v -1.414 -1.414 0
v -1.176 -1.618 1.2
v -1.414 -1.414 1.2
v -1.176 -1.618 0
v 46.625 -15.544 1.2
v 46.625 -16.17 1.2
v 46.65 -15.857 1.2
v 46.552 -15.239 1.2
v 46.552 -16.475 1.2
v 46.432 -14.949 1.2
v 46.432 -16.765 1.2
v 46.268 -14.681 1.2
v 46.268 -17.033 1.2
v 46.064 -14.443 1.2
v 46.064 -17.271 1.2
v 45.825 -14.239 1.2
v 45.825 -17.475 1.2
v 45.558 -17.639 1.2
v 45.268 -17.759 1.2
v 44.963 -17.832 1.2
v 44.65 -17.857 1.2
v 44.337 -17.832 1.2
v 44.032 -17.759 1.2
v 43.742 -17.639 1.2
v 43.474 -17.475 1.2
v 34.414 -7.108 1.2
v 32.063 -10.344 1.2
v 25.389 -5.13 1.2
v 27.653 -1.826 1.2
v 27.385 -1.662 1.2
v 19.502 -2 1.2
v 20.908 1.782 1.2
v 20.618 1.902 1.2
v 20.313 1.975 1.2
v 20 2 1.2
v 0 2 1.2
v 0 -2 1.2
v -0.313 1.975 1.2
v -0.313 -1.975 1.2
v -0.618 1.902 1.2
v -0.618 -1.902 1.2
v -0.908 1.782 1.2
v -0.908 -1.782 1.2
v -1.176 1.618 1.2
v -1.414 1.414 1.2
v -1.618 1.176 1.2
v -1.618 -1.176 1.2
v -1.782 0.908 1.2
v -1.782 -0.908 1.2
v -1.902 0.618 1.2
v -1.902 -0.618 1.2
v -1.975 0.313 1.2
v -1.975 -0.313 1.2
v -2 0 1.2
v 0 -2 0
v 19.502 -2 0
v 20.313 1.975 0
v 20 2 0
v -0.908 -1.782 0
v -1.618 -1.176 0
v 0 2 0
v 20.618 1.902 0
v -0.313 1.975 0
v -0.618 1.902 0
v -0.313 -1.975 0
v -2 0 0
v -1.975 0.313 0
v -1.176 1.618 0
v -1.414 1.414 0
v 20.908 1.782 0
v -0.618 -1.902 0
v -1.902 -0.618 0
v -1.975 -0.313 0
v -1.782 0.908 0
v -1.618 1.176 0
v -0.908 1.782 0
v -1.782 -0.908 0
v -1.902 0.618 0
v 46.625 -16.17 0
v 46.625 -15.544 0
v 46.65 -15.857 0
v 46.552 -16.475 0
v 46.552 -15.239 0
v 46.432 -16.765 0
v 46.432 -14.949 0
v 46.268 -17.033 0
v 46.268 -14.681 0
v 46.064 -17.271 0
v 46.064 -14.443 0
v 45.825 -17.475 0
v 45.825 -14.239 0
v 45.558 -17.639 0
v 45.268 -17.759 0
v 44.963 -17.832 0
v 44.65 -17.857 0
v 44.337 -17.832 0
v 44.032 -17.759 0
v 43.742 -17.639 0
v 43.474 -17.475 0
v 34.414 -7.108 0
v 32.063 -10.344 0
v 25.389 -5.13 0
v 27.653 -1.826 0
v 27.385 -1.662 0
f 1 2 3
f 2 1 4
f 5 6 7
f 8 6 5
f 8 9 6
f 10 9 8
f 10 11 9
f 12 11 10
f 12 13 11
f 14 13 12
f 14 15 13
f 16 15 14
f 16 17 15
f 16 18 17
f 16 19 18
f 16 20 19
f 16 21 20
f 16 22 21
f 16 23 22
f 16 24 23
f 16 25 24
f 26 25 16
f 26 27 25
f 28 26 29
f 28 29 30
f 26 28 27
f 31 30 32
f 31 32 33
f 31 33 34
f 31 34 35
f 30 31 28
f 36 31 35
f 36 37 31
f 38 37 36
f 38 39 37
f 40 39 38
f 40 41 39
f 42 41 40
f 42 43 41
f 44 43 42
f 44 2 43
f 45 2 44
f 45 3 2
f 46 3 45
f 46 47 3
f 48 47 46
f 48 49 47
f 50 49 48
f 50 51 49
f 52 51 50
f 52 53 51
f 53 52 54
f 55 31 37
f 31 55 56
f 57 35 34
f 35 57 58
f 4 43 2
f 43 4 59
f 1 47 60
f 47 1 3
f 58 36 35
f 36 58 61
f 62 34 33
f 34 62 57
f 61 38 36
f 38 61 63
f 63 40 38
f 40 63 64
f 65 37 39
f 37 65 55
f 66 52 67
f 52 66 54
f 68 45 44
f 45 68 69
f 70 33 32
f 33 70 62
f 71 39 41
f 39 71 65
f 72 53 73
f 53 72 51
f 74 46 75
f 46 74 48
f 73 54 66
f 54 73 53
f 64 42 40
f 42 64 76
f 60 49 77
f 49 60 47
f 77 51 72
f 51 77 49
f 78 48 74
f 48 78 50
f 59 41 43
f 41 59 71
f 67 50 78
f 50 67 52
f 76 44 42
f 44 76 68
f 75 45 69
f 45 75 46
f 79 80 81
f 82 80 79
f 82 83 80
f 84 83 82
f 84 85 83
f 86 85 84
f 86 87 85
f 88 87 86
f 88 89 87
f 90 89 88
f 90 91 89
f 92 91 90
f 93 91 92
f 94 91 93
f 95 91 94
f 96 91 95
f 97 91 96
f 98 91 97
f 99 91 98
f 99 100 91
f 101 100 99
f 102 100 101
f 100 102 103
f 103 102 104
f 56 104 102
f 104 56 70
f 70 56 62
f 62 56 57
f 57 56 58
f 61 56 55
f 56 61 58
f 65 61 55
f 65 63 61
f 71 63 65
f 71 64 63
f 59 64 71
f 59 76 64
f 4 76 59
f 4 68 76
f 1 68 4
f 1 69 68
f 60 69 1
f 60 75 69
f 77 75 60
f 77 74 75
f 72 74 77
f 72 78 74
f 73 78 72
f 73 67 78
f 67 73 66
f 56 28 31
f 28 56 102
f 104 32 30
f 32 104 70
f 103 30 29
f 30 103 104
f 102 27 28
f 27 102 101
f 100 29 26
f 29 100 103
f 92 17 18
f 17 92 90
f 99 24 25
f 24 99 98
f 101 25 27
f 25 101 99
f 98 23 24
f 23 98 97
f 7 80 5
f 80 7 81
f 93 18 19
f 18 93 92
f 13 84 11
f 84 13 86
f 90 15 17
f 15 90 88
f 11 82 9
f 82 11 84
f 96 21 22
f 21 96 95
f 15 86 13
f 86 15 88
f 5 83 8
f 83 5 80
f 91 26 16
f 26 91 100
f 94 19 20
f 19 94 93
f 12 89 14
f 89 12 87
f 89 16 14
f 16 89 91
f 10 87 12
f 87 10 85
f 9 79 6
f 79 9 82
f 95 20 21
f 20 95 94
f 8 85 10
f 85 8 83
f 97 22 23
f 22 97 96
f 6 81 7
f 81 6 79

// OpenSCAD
// X-Finger distal identified geometry v1.0
// IDENTIFIED_GEOMETRY from two mirrored CAD views.
// Absolute scale is intentionally parameterized.

datum = 20.0; // mm placeholder for |P0P1|; ESTIMATED until calibration

r01 = 1.0000;
r12 = 0.3668;
r23 = 0.4290;
r34 = 0.6728;

// Reference turning geometry reconstructed from normalized upper-view landmarks.
// This file is a kinematic skeleton, not a manufacturing part.

P0 = [0,0];
P1 = [datum,0];

// approximate signed turn angles derived from the identified view
a12 = -28.0;
a23 = -10.0;
a34 =  6.0;

function v2(L,a) = [L*cos(a), L*sin(a)];

P2 = P1 + v2(datum*r12,a12);
P3 = P2 + v2(datum*r23,a12+a23);
P4 = P3 + v2(datum*r34,a12+a23+a34);

module joint(p,d=2.0,h=1.2) {
    translate([p[0],p[1],0]) cylinder(d=d,h=h,$fn=40);
}

module link(a,b,w=4,h=1.2) {
    hull() {
        translate([a[0],a[1],0]) cylinder(d=w,h=h,$fn=40);
        translate([b[0],b[1],0]) cylinder(d=w,h=h,$fn=40);
    }
}

link(P0,P1);
link(P1,P2);
link(P2,P3);
link(P3,P4);

joint(P0); joint(P1); joint(P2); joint(P3); joint(P4);
